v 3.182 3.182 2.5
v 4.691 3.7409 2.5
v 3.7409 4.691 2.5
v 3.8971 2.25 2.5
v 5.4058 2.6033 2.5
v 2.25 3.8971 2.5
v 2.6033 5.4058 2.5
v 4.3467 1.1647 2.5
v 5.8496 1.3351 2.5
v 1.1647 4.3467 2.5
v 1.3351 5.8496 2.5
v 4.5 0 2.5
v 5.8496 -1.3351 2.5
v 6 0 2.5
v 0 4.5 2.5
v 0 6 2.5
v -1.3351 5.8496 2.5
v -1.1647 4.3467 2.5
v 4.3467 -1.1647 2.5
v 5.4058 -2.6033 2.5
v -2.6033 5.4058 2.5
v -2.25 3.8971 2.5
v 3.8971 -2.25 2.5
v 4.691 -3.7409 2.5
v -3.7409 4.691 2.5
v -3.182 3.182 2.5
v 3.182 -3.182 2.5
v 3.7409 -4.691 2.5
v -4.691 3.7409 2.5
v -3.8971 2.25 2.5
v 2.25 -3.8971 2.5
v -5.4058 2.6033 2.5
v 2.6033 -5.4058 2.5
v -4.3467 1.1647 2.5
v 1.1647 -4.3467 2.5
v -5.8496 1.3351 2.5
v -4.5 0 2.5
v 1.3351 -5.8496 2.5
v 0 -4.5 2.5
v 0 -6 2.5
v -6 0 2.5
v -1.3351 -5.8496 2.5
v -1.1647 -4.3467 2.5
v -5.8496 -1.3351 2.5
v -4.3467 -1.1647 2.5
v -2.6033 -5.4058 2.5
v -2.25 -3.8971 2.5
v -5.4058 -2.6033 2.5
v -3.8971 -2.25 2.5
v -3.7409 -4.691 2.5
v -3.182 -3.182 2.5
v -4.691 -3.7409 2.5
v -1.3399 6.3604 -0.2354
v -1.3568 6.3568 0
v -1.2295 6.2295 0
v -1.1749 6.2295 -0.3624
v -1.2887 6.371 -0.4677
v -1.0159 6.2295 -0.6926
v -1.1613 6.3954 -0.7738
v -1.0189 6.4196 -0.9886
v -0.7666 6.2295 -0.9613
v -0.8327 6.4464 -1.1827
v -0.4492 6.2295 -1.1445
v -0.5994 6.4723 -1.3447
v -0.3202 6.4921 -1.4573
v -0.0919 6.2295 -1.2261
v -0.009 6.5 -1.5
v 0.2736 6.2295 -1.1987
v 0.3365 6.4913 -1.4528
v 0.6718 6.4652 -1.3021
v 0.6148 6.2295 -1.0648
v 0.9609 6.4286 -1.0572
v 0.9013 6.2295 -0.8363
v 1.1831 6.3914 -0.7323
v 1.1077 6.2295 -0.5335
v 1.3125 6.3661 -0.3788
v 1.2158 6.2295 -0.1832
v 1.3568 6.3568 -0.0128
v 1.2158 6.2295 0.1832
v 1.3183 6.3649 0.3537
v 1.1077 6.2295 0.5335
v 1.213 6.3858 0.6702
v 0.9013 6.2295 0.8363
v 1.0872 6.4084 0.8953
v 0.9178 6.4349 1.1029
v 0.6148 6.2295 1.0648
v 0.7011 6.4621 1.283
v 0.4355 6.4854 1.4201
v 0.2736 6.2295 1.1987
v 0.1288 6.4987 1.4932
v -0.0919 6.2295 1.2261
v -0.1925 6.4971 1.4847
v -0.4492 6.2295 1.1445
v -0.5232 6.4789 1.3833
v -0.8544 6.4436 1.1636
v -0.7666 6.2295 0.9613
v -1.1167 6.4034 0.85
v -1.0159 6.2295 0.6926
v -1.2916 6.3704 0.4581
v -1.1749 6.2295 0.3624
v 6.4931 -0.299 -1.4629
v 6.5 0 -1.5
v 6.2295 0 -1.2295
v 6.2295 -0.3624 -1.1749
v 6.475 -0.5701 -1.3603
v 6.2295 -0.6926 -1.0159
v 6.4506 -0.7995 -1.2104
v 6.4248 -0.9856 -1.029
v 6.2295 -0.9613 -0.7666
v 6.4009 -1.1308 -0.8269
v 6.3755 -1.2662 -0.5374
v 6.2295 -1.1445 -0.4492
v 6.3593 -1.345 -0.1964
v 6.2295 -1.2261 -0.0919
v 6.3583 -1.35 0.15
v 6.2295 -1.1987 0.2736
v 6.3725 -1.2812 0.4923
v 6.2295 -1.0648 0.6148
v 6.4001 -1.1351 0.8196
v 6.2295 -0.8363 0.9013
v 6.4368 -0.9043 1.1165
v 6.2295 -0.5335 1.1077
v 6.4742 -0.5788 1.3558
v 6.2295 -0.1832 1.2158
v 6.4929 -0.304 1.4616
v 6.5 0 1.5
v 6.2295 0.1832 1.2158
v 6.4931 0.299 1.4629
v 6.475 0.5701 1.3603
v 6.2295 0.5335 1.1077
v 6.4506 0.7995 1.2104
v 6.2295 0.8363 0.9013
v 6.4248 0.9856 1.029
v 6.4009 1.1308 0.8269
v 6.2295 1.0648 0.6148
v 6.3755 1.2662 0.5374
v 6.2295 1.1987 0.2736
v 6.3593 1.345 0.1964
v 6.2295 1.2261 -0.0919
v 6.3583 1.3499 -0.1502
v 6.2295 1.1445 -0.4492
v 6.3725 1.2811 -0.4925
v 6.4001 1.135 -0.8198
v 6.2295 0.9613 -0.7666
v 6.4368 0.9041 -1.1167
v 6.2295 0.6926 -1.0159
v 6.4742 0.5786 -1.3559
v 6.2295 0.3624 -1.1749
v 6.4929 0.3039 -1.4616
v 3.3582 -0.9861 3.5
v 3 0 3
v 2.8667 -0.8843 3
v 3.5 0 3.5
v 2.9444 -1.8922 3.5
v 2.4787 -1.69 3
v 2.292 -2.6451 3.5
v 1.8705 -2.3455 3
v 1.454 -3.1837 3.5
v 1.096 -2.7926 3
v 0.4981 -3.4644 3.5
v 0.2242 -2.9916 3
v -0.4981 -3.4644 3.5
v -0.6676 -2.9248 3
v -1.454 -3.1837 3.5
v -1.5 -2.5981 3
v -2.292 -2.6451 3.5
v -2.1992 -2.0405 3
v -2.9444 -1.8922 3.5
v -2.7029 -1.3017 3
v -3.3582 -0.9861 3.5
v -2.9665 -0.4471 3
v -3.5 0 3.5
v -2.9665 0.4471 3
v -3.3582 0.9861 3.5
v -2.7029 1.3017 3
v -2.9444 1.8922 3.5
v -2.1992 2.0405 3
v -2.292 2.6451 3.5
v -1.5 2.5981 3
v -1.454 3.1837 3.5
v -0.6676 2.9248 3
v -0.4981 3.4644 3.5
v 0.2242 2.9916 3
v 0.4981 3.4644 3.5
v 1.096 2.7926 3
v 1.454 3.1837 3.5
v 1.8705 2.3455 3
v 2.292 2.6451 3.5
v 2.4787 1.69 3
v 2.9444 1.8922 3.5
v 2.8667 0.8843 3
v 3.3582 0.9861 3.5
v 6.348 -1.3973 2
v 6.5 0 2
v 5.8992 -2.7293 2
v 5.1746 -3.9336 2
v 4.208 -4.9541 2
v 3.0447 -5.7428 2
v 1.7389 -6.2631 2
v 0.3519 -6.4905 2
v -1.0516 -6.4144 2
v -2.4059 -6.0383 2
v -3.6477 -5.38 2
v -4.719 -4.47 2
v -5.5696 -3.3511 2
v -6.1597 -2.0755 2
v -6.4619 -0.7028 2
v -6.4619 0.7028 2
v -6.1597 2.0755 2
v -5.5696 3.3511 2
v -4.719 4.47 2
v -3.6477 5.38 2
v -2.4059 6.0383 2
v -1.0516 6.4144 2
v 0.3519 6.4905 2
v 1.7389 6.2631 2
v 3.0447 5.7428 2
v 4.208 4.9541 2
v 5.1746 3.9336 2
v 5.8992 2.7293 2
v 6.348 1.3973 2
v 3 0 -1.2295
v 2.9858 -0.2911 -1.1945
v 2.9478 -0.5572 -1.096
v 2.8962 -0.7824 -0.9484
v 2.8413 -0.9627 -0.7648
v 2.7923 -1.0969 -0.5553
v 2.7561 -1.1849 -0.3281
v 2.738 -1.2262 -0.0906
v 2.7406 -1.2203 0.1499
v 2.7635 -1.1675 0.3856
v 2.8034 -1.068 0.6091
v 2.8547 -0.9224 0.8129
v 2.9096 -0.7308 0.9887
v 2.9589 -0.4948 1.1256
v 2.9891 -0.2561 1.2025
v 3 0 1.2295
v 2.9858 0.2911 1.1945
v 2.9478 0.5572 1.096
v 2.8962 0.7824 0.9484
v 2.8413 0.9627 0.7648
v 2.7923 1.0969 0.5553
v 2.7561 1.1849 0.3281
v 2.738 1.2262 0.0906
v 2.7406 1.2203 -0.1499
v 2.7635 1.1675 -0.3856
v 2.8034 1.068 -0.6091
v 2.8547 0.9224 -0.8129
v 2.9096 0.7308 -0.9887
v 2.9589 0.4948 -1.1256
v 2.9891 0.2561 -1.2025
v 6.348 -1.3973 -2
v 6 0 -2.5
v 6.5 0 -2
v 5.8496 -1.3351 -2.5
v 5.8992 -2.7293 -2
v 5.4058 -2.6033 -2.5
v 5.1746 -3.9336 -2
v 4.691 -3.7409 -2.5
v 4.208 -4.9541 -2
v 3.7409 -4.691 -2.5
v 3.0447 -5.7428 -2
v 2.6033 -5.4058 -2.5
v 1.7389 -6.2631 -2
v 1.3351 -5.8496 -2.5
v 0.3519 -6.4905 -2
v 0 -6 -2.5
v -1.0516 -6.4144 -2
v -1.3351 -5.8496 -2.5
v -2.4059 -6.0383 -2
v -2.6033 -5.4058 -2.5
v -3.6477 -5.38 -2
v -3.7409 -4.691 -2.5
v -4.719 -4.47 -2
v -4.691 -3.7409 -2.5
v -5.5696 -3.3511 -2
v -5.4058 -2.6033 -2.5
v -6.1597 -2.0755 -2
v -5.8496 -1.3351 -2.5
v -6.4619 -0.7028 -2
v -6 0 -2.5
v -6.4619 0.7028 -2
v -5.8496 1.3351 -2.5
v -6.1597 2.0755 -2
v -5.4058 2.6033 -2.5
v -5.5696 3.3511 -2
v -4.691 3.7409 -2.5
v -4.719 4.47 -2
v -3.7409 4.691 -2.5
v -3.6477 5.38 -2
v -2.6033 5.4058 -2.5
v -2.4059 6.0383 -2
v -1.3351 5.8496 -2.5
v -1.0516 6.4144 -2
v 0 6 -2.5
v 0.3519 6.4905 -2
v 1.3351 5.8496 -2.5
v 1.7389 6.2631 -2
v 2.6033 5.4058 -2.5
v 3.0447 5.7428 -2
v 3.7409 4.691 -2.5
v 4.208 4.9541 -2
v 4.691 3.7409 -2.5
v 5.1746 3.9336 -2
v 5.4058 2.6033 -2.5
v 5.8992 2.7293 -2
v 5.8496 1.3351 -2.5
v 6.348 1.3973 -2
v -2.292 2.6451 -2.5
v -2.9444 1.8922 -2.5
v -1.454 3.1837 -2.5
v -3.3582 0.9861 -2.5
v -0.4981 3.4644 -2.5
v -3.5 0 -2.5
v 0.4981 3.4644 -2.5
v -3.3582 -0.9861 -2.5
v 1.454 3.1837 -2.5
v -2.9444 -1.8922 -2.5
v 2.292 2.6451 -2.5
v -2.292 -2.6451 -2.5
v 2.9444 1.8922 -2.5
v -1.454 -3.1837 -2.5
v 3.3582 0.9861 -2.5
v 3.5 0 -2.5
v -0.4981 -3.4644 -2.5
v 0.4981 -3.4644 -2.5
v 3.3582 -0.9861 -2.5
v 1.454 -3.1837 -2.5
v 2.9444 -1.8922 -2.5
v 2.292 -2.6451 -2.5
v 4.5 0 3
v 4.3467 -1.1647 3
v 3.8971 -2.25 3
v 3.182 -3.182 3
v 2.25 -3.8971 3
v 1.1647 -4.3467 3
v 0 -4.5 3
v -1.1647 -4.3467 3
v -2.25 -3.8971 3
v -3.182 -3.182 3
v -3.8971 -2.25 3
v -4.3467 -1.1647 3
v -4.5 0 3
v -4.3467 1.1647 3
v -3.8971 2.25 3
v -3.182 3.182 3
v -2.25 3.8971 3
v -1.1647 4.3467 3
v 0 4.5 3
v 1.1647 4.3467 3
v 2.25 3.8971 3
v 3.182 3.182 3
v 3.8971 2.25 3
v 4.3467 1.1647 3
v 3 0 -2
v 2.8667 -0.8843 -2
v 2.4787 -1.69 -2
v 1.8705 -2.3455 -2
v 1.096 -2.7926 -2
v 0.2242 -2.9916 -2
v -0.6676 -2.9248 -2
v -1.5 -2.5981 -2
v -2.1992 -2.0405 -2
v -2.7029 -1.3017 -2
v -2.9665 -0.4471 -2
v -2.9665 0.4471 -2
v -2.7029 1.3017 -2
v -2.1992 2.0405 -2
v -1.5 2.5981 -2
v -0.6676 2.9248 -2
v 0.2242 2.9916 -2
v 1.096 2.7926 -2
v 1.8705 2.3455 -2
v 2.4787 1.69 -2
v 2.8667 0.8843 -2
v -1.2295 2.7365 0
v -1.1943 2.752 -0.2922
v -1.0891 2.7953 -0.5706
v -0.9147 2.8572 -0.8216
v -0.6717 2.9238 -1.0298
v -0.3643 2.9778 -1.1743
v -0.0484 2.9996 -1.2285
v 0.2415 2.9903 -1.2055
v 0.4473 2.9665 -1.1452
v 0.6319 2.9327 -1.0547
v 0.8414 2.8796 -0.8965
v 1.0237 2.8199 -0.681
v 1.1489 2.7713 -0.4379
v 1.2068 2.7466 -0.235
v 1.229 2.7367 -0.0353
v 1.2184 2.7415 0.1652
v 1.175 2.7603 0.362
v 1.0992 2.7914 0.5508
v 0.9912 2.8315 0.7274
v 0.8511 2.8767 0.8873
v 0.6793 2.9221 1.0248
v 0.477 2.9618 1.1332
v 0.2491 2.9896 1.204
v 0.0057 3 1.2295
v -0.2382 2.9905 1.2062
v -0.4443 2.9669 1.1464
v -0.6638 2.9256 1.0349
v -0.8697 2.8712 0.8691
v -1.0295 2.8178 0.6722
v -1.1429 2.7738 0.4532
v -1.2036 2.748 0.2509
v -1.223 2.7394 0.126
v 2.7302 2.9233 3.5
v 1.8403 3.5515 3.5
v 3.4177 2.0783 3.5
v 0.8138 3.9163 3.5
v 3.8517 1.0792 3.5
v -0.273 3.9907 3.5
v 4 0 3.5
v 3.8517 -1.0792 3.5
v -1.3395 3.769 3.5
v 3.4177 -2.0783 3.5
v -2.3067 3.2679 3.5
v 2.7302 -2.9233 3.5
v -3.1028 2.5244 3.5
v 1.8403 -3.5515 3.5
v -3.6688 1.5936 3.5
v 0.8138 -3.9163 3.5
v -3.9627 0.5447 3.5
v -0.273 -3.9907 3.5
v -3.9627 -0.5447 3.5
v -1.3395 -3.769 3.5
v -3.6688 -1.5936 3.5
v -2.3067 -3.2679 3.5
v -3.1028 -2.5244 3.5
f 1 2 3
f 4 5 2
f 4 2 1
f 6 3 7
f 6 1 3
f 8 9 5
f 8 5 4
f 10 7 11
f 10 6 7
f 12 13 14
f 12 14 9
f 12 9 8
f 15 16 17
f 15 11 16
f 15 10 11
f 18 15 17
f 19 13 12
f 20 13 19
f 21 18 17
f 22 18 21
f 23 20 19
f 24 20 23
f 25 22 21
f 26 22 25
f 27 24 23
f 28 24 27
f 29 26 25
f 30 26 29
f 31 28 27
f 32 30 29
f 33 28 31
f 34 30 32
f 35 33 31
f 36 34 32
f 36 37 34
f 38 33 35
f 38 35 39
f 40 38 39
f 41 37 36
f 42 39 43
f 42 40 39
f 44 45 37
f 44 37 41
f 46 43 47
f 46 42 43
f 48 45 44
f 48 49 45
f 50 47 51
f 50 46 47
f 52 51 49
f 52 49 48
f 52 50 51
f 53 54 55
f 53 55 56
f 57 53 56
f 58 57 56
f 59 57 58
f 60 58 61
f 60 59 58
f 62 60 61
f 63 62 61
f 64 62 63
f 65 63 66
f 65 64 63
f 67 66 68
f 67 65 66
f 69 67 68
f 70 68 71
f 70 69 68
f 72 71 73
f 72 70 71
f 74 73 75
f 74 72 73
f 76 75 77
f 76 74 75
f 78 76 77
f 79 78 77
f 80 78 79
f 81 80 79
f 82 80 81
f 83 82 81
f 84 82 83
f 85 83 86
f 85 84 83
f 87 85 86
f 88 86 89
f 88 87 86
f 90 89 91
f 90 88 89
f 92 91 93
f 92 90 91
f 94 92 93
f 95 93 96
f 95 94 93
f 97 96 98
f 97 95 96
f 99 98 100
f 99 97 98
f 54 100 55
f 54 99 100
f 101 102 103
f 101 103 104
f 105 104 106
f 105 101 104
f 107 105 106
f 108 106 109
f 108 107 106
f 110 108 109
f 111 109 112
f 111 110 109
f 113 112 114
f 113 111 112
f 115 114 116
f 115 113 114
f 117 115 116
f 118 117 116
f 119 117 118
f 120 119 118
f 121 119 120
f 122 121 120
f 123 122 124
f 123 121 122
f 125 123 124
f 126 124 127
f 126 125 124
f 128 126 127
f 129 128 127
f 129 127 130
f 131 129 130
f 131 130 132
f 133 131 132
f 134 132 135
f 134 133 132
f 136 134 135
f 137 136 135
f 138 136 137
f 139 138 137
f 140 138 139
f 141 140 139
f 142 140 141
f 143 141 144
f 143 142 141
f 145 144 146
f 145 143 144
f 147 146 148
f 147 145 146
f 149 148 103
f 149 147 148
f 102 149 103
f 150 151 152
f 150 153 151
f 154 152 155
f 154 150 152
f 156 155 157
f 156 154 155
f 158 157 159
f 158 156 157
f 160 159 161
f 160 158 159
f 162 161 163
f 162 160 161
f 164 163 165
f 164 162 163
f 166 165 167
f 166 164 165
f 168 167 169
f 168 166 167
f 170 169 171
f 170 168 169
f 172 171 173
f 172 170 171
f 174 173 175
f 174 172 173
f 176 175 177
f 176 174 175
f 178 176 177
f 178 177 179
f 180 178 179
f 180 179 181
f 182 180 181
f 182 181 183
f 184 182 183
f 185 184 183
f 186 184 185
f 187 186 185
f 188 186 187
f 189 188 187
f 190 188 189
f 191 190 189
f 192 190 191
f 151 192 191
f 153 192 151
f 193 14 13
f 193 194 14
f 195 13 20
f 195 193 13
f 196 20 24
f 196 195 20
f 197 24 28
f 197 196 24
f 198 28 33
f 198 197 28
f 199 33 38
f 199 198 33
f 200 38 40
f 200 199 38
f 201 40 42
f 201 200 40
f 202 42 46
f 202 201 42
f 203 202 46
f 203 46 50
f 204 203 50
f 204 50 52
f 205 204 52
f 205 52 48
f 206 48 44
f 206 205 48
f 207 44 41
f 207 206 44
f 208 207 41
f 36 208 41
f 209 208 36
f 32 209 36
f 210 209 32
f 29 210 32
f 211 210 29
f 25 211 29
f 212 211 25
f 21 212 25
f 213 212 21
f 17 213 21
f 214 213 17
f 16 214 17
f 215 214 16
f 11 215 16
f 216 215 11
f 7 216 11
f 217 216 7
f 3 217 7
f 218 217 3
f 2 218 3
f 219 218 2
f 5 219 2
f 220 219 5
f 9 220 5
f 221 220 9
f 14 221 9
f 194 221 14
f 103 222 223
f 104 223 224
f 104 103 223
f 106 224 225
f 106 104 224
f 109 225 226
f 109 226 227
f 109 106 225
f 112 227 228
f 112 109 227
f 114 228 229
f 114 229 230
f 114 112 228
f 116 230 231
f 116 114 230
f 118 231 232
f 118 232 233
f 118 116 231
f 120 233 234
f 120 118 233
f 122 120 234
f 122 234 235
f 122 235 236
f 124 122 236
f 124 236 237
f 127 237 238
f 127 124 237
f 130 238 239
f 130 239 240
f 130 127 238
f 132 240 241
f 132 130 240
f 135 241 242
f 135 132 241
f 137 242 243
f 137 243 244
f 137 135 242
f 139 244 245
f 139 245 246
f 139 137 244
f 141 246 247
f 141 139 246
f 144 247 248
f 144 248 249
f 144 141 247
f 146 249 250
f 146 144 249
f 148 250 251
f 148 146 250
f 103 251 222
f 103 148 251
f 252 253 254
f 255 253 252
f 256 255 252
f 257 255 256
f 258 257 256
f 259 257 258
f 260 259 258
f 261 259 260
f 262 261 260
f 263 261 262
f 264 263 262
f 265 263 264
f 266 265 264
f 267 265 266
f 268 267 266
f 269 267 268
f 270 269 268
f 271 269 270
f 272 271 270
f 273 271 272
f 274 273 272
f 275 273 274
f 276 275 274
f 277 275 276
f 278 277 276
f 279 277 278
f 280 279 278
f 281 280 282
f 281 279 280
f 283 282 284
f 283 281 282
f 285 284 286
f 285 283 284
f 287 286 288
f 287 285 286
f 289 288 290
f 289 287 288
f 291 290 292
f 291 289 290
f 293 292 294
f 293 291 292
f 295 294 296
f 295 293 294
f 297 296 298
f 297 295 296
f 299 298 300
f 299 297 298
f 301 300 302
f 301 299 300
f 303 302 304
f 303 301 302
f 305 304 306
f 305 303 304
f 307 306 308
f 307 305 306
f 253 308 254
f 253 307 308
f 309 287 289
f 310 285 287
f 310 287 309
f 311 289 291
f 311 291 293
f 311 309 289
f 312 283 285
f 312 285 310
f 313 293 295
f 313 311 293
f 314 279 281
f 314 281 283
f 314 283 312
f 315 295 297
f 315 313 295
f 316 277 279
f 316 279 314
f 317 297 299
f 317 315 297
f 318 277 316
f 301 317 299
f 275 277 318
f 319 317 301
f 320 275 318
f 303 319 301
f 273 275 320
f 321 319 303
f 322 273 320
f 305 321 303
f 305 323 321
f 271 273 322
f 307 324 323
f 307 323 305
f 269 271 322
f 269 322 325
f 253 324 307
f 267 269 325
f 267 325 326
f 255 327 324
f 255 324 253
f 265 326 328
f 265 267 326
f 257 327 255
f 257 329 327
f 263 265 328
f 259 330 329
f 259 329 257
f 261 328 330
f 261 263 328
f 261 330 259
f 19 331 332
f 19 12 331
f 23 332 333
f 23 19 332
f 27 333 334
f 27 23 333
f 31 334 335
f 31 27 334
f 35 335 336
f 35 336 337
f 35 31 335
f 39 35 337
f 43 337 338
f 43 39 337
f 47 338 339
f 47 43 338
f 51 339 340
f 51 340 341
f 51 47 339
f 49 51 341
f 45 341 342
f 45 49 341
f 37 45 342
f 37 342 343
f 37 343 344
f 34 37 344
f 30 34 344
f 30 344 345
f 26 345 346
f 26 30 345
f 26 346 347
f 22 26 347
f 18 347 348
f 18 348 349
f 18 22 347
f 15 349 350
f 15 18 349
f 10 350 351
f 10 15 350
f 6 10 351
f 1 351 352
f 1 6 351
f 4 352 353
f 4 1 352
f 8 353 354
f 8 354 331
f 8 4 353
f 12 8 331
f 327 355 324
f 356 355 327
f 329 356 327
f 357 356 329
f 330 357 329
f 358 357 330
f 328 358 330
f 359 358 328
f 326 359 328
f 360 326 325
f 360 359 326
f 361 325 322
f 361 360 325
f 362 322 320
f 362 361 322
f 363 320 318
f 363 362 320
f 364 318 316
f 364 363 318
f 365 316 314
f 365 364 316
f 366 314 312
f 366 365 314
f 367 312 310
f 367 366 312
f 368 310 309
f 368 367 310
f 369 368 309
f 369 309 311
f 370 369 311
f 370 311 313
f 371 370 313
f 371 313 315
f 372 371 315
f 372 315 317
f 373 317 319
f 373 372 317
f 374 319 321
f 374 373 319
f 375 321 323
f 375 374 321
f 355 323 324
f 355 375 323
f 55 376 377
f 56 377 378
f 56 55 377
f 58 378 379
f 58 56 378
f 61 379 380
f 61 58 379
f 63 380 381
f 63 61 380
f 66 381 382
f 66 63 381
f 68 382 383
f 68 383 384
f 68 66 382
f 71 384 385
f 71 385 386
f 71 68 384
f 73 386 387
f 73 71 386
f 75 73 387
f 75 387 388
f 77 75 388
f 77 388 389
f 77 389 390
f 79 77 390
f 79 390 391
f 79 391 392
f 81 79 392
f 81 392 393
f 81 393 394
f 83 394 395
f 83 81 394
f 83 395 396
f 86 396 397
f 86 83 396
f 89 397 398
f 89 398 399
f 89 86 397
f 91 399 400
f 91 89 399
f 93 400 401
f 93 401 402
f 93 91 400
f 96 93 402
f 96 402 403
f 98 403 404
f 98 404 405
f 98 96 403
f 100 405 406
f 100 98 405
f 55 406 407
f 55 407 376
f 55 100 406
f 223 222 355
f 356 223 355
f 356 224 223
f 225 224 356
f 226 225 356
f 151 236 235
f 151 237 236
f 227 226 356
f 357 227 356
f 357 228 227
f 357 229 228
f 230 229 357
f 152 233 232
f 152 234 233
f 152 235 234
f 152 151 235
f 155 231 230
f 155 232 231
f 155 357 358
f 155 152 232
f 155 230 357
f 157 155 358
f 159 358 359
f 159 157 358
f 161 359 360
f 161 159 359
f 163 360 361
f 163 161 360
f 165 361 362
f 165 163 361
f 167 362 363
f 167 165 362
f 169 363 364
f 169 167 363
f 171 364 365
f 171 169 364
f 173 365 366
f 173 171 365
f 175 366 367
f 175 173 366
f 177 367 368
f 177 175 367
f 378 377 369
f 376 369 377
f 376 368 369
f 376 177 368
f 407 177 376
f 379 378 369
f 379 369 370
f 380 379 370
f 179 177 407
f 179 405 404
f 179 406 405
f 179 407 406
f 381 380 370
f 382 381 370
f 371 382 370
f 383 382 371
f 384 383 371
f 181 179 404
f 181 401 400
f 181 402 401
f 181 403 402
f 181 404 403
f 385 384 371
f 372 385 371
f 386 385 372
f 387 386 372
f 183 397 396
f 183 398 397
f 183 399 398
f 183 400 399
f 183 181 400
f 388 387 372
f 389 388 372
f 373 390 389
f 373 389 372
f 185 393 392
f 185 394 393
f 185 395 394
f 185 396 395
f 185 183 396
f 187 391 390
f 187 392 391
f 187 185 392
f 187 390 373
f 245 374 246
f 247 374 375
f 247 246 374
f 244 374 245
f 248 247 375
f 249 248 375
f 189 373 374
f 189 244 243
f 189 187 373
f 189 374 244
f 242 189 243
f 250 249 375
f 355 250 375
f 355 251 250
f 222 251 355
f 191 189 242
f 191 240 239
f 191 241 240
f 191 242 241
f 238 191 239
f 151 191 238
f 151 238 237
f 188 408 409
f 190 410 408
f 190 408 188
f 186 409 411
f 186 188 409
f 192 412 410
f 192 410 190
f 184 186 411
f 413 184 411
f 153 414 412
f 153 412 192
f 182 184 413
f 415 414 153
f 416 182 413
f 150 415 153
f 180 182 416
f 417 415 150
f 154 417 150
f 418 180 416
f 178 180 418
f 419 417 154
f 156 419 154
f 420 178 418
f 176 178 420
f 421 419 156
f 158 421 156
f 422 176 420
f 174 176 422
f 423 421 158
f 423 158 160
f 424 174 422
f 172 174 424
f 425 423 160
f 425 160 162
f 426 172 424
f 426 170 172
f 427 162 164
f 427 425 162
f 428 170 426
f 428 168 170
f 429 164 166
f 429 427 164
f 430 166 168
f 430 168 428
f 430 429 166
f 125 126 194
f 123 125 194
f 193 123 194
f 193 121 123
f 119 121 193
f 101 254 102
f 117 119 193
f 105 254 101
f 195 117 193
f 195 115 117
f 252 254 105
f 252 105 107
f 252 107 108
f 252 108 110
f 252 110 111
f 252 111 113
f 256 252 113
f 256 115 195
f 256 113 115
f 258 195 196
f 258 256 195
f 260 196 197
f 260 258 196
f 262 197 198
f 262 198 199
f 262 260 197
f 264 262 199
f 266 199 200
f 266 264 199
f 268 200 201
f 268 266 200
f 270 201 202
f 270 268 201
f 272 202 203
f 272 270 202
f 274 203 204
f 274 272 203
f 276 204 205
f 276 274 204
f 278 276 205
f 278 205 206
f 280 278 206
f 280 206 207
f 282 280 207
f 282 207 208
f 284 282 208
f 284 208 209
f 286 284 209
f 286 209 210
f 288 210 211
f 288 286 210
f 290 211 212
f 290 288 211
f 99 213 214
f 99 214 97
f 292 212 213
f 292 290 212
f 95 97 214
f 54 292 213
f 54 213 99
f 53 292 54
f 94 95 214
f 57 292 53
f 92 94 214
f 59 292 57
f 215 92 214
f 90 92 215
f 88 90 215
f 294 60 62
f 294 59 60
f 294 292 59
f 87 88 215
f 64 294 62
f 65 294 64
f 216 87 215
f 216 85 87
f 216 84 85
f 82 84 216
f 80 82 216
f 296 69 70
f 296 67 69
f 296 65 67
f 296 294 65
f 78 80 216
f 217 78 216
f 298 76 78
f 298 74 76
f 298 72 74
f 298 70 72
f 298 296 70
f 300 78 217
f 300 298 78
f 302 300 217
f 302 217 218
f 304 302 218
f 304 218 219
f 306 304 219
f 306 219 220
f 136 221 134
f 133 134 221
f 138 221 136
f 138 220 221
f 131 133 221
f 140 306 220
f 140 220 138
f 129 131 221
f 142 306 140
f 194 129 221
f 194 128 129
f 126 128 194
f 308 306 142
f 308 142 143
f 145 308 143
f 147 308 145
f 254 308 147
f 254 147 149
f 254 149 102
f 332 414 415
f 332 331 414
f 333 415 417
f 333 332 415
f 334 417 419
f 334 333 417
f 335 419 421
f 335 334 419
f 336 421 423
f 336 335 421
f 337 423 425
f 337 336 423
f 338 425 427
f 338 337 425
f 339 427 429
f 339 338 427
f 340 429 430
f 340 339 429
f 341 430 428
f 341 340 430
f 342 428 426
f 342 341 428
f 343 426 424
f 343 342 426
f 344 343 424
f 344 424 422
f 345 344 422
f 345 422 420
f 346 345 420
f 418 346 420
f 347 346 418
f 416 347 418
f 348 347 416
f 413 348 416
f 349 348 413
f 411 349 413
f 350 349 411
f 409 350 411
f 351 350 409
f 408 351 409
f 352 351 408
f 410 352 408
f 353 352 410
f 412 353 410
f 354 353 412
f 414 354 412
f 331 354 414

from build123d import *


with BuildPart() as part:
    # Esquisse1 → Révolution1 (revolve)
    with BuildSketch(Plane(origin=(0, 0, 0), x_dir=(1, 0, 0), z_dir=(0, 1, 0))):
        Polygon((3, 2), (3, -3), (3.5, -3.5), (4, -3.5), (4.5, -3), (4.5, -2.5), (6, -2.5), (6.5, -2), (6.5, 2), (6, 2.5), (3.5, 2.5), align=None)
    revolve(axis=Axis((0, 0, 3.5), (0, 0, -1)))

    # Esquisse2 → Enlèvement de matière-Révolution1 (revolve, cut)
    with BuildSketch(Plane.XY, mode=Mode.PRIVATE) as enl_vement_de_mati_re_r_volution1_sk:
        Polygon((2, 0), (2, 1.2295), (6.2295, 1.2295), (6.5, 1.5), (6.5, 0), align=None)
    revolve(enl_vement_de_mati_re_r_volution1_sk.sketch.rotate(Axis((6.5, 0, 0), (-1, 0, 0)), 90), axis=Axis((6.5, 0, 0), (-1, 0, 0)), mode=Mode.SUBTRACT)

    # Esquisse3 → Enlèvement de matière-Révolution2 (revolve, cut)
    with BuildSketch(Plane.XY):
        Polygon((0, 2), (-1.2295, 2), (-1.2295, 6.2295), (-1.5, 6.5), (0, 6.5), align=None)
    revolve(axis=Axis((0, 6.5, 0), (0, -1, 0)), mode=Mode.SUBTRACT)


solid = part.part
